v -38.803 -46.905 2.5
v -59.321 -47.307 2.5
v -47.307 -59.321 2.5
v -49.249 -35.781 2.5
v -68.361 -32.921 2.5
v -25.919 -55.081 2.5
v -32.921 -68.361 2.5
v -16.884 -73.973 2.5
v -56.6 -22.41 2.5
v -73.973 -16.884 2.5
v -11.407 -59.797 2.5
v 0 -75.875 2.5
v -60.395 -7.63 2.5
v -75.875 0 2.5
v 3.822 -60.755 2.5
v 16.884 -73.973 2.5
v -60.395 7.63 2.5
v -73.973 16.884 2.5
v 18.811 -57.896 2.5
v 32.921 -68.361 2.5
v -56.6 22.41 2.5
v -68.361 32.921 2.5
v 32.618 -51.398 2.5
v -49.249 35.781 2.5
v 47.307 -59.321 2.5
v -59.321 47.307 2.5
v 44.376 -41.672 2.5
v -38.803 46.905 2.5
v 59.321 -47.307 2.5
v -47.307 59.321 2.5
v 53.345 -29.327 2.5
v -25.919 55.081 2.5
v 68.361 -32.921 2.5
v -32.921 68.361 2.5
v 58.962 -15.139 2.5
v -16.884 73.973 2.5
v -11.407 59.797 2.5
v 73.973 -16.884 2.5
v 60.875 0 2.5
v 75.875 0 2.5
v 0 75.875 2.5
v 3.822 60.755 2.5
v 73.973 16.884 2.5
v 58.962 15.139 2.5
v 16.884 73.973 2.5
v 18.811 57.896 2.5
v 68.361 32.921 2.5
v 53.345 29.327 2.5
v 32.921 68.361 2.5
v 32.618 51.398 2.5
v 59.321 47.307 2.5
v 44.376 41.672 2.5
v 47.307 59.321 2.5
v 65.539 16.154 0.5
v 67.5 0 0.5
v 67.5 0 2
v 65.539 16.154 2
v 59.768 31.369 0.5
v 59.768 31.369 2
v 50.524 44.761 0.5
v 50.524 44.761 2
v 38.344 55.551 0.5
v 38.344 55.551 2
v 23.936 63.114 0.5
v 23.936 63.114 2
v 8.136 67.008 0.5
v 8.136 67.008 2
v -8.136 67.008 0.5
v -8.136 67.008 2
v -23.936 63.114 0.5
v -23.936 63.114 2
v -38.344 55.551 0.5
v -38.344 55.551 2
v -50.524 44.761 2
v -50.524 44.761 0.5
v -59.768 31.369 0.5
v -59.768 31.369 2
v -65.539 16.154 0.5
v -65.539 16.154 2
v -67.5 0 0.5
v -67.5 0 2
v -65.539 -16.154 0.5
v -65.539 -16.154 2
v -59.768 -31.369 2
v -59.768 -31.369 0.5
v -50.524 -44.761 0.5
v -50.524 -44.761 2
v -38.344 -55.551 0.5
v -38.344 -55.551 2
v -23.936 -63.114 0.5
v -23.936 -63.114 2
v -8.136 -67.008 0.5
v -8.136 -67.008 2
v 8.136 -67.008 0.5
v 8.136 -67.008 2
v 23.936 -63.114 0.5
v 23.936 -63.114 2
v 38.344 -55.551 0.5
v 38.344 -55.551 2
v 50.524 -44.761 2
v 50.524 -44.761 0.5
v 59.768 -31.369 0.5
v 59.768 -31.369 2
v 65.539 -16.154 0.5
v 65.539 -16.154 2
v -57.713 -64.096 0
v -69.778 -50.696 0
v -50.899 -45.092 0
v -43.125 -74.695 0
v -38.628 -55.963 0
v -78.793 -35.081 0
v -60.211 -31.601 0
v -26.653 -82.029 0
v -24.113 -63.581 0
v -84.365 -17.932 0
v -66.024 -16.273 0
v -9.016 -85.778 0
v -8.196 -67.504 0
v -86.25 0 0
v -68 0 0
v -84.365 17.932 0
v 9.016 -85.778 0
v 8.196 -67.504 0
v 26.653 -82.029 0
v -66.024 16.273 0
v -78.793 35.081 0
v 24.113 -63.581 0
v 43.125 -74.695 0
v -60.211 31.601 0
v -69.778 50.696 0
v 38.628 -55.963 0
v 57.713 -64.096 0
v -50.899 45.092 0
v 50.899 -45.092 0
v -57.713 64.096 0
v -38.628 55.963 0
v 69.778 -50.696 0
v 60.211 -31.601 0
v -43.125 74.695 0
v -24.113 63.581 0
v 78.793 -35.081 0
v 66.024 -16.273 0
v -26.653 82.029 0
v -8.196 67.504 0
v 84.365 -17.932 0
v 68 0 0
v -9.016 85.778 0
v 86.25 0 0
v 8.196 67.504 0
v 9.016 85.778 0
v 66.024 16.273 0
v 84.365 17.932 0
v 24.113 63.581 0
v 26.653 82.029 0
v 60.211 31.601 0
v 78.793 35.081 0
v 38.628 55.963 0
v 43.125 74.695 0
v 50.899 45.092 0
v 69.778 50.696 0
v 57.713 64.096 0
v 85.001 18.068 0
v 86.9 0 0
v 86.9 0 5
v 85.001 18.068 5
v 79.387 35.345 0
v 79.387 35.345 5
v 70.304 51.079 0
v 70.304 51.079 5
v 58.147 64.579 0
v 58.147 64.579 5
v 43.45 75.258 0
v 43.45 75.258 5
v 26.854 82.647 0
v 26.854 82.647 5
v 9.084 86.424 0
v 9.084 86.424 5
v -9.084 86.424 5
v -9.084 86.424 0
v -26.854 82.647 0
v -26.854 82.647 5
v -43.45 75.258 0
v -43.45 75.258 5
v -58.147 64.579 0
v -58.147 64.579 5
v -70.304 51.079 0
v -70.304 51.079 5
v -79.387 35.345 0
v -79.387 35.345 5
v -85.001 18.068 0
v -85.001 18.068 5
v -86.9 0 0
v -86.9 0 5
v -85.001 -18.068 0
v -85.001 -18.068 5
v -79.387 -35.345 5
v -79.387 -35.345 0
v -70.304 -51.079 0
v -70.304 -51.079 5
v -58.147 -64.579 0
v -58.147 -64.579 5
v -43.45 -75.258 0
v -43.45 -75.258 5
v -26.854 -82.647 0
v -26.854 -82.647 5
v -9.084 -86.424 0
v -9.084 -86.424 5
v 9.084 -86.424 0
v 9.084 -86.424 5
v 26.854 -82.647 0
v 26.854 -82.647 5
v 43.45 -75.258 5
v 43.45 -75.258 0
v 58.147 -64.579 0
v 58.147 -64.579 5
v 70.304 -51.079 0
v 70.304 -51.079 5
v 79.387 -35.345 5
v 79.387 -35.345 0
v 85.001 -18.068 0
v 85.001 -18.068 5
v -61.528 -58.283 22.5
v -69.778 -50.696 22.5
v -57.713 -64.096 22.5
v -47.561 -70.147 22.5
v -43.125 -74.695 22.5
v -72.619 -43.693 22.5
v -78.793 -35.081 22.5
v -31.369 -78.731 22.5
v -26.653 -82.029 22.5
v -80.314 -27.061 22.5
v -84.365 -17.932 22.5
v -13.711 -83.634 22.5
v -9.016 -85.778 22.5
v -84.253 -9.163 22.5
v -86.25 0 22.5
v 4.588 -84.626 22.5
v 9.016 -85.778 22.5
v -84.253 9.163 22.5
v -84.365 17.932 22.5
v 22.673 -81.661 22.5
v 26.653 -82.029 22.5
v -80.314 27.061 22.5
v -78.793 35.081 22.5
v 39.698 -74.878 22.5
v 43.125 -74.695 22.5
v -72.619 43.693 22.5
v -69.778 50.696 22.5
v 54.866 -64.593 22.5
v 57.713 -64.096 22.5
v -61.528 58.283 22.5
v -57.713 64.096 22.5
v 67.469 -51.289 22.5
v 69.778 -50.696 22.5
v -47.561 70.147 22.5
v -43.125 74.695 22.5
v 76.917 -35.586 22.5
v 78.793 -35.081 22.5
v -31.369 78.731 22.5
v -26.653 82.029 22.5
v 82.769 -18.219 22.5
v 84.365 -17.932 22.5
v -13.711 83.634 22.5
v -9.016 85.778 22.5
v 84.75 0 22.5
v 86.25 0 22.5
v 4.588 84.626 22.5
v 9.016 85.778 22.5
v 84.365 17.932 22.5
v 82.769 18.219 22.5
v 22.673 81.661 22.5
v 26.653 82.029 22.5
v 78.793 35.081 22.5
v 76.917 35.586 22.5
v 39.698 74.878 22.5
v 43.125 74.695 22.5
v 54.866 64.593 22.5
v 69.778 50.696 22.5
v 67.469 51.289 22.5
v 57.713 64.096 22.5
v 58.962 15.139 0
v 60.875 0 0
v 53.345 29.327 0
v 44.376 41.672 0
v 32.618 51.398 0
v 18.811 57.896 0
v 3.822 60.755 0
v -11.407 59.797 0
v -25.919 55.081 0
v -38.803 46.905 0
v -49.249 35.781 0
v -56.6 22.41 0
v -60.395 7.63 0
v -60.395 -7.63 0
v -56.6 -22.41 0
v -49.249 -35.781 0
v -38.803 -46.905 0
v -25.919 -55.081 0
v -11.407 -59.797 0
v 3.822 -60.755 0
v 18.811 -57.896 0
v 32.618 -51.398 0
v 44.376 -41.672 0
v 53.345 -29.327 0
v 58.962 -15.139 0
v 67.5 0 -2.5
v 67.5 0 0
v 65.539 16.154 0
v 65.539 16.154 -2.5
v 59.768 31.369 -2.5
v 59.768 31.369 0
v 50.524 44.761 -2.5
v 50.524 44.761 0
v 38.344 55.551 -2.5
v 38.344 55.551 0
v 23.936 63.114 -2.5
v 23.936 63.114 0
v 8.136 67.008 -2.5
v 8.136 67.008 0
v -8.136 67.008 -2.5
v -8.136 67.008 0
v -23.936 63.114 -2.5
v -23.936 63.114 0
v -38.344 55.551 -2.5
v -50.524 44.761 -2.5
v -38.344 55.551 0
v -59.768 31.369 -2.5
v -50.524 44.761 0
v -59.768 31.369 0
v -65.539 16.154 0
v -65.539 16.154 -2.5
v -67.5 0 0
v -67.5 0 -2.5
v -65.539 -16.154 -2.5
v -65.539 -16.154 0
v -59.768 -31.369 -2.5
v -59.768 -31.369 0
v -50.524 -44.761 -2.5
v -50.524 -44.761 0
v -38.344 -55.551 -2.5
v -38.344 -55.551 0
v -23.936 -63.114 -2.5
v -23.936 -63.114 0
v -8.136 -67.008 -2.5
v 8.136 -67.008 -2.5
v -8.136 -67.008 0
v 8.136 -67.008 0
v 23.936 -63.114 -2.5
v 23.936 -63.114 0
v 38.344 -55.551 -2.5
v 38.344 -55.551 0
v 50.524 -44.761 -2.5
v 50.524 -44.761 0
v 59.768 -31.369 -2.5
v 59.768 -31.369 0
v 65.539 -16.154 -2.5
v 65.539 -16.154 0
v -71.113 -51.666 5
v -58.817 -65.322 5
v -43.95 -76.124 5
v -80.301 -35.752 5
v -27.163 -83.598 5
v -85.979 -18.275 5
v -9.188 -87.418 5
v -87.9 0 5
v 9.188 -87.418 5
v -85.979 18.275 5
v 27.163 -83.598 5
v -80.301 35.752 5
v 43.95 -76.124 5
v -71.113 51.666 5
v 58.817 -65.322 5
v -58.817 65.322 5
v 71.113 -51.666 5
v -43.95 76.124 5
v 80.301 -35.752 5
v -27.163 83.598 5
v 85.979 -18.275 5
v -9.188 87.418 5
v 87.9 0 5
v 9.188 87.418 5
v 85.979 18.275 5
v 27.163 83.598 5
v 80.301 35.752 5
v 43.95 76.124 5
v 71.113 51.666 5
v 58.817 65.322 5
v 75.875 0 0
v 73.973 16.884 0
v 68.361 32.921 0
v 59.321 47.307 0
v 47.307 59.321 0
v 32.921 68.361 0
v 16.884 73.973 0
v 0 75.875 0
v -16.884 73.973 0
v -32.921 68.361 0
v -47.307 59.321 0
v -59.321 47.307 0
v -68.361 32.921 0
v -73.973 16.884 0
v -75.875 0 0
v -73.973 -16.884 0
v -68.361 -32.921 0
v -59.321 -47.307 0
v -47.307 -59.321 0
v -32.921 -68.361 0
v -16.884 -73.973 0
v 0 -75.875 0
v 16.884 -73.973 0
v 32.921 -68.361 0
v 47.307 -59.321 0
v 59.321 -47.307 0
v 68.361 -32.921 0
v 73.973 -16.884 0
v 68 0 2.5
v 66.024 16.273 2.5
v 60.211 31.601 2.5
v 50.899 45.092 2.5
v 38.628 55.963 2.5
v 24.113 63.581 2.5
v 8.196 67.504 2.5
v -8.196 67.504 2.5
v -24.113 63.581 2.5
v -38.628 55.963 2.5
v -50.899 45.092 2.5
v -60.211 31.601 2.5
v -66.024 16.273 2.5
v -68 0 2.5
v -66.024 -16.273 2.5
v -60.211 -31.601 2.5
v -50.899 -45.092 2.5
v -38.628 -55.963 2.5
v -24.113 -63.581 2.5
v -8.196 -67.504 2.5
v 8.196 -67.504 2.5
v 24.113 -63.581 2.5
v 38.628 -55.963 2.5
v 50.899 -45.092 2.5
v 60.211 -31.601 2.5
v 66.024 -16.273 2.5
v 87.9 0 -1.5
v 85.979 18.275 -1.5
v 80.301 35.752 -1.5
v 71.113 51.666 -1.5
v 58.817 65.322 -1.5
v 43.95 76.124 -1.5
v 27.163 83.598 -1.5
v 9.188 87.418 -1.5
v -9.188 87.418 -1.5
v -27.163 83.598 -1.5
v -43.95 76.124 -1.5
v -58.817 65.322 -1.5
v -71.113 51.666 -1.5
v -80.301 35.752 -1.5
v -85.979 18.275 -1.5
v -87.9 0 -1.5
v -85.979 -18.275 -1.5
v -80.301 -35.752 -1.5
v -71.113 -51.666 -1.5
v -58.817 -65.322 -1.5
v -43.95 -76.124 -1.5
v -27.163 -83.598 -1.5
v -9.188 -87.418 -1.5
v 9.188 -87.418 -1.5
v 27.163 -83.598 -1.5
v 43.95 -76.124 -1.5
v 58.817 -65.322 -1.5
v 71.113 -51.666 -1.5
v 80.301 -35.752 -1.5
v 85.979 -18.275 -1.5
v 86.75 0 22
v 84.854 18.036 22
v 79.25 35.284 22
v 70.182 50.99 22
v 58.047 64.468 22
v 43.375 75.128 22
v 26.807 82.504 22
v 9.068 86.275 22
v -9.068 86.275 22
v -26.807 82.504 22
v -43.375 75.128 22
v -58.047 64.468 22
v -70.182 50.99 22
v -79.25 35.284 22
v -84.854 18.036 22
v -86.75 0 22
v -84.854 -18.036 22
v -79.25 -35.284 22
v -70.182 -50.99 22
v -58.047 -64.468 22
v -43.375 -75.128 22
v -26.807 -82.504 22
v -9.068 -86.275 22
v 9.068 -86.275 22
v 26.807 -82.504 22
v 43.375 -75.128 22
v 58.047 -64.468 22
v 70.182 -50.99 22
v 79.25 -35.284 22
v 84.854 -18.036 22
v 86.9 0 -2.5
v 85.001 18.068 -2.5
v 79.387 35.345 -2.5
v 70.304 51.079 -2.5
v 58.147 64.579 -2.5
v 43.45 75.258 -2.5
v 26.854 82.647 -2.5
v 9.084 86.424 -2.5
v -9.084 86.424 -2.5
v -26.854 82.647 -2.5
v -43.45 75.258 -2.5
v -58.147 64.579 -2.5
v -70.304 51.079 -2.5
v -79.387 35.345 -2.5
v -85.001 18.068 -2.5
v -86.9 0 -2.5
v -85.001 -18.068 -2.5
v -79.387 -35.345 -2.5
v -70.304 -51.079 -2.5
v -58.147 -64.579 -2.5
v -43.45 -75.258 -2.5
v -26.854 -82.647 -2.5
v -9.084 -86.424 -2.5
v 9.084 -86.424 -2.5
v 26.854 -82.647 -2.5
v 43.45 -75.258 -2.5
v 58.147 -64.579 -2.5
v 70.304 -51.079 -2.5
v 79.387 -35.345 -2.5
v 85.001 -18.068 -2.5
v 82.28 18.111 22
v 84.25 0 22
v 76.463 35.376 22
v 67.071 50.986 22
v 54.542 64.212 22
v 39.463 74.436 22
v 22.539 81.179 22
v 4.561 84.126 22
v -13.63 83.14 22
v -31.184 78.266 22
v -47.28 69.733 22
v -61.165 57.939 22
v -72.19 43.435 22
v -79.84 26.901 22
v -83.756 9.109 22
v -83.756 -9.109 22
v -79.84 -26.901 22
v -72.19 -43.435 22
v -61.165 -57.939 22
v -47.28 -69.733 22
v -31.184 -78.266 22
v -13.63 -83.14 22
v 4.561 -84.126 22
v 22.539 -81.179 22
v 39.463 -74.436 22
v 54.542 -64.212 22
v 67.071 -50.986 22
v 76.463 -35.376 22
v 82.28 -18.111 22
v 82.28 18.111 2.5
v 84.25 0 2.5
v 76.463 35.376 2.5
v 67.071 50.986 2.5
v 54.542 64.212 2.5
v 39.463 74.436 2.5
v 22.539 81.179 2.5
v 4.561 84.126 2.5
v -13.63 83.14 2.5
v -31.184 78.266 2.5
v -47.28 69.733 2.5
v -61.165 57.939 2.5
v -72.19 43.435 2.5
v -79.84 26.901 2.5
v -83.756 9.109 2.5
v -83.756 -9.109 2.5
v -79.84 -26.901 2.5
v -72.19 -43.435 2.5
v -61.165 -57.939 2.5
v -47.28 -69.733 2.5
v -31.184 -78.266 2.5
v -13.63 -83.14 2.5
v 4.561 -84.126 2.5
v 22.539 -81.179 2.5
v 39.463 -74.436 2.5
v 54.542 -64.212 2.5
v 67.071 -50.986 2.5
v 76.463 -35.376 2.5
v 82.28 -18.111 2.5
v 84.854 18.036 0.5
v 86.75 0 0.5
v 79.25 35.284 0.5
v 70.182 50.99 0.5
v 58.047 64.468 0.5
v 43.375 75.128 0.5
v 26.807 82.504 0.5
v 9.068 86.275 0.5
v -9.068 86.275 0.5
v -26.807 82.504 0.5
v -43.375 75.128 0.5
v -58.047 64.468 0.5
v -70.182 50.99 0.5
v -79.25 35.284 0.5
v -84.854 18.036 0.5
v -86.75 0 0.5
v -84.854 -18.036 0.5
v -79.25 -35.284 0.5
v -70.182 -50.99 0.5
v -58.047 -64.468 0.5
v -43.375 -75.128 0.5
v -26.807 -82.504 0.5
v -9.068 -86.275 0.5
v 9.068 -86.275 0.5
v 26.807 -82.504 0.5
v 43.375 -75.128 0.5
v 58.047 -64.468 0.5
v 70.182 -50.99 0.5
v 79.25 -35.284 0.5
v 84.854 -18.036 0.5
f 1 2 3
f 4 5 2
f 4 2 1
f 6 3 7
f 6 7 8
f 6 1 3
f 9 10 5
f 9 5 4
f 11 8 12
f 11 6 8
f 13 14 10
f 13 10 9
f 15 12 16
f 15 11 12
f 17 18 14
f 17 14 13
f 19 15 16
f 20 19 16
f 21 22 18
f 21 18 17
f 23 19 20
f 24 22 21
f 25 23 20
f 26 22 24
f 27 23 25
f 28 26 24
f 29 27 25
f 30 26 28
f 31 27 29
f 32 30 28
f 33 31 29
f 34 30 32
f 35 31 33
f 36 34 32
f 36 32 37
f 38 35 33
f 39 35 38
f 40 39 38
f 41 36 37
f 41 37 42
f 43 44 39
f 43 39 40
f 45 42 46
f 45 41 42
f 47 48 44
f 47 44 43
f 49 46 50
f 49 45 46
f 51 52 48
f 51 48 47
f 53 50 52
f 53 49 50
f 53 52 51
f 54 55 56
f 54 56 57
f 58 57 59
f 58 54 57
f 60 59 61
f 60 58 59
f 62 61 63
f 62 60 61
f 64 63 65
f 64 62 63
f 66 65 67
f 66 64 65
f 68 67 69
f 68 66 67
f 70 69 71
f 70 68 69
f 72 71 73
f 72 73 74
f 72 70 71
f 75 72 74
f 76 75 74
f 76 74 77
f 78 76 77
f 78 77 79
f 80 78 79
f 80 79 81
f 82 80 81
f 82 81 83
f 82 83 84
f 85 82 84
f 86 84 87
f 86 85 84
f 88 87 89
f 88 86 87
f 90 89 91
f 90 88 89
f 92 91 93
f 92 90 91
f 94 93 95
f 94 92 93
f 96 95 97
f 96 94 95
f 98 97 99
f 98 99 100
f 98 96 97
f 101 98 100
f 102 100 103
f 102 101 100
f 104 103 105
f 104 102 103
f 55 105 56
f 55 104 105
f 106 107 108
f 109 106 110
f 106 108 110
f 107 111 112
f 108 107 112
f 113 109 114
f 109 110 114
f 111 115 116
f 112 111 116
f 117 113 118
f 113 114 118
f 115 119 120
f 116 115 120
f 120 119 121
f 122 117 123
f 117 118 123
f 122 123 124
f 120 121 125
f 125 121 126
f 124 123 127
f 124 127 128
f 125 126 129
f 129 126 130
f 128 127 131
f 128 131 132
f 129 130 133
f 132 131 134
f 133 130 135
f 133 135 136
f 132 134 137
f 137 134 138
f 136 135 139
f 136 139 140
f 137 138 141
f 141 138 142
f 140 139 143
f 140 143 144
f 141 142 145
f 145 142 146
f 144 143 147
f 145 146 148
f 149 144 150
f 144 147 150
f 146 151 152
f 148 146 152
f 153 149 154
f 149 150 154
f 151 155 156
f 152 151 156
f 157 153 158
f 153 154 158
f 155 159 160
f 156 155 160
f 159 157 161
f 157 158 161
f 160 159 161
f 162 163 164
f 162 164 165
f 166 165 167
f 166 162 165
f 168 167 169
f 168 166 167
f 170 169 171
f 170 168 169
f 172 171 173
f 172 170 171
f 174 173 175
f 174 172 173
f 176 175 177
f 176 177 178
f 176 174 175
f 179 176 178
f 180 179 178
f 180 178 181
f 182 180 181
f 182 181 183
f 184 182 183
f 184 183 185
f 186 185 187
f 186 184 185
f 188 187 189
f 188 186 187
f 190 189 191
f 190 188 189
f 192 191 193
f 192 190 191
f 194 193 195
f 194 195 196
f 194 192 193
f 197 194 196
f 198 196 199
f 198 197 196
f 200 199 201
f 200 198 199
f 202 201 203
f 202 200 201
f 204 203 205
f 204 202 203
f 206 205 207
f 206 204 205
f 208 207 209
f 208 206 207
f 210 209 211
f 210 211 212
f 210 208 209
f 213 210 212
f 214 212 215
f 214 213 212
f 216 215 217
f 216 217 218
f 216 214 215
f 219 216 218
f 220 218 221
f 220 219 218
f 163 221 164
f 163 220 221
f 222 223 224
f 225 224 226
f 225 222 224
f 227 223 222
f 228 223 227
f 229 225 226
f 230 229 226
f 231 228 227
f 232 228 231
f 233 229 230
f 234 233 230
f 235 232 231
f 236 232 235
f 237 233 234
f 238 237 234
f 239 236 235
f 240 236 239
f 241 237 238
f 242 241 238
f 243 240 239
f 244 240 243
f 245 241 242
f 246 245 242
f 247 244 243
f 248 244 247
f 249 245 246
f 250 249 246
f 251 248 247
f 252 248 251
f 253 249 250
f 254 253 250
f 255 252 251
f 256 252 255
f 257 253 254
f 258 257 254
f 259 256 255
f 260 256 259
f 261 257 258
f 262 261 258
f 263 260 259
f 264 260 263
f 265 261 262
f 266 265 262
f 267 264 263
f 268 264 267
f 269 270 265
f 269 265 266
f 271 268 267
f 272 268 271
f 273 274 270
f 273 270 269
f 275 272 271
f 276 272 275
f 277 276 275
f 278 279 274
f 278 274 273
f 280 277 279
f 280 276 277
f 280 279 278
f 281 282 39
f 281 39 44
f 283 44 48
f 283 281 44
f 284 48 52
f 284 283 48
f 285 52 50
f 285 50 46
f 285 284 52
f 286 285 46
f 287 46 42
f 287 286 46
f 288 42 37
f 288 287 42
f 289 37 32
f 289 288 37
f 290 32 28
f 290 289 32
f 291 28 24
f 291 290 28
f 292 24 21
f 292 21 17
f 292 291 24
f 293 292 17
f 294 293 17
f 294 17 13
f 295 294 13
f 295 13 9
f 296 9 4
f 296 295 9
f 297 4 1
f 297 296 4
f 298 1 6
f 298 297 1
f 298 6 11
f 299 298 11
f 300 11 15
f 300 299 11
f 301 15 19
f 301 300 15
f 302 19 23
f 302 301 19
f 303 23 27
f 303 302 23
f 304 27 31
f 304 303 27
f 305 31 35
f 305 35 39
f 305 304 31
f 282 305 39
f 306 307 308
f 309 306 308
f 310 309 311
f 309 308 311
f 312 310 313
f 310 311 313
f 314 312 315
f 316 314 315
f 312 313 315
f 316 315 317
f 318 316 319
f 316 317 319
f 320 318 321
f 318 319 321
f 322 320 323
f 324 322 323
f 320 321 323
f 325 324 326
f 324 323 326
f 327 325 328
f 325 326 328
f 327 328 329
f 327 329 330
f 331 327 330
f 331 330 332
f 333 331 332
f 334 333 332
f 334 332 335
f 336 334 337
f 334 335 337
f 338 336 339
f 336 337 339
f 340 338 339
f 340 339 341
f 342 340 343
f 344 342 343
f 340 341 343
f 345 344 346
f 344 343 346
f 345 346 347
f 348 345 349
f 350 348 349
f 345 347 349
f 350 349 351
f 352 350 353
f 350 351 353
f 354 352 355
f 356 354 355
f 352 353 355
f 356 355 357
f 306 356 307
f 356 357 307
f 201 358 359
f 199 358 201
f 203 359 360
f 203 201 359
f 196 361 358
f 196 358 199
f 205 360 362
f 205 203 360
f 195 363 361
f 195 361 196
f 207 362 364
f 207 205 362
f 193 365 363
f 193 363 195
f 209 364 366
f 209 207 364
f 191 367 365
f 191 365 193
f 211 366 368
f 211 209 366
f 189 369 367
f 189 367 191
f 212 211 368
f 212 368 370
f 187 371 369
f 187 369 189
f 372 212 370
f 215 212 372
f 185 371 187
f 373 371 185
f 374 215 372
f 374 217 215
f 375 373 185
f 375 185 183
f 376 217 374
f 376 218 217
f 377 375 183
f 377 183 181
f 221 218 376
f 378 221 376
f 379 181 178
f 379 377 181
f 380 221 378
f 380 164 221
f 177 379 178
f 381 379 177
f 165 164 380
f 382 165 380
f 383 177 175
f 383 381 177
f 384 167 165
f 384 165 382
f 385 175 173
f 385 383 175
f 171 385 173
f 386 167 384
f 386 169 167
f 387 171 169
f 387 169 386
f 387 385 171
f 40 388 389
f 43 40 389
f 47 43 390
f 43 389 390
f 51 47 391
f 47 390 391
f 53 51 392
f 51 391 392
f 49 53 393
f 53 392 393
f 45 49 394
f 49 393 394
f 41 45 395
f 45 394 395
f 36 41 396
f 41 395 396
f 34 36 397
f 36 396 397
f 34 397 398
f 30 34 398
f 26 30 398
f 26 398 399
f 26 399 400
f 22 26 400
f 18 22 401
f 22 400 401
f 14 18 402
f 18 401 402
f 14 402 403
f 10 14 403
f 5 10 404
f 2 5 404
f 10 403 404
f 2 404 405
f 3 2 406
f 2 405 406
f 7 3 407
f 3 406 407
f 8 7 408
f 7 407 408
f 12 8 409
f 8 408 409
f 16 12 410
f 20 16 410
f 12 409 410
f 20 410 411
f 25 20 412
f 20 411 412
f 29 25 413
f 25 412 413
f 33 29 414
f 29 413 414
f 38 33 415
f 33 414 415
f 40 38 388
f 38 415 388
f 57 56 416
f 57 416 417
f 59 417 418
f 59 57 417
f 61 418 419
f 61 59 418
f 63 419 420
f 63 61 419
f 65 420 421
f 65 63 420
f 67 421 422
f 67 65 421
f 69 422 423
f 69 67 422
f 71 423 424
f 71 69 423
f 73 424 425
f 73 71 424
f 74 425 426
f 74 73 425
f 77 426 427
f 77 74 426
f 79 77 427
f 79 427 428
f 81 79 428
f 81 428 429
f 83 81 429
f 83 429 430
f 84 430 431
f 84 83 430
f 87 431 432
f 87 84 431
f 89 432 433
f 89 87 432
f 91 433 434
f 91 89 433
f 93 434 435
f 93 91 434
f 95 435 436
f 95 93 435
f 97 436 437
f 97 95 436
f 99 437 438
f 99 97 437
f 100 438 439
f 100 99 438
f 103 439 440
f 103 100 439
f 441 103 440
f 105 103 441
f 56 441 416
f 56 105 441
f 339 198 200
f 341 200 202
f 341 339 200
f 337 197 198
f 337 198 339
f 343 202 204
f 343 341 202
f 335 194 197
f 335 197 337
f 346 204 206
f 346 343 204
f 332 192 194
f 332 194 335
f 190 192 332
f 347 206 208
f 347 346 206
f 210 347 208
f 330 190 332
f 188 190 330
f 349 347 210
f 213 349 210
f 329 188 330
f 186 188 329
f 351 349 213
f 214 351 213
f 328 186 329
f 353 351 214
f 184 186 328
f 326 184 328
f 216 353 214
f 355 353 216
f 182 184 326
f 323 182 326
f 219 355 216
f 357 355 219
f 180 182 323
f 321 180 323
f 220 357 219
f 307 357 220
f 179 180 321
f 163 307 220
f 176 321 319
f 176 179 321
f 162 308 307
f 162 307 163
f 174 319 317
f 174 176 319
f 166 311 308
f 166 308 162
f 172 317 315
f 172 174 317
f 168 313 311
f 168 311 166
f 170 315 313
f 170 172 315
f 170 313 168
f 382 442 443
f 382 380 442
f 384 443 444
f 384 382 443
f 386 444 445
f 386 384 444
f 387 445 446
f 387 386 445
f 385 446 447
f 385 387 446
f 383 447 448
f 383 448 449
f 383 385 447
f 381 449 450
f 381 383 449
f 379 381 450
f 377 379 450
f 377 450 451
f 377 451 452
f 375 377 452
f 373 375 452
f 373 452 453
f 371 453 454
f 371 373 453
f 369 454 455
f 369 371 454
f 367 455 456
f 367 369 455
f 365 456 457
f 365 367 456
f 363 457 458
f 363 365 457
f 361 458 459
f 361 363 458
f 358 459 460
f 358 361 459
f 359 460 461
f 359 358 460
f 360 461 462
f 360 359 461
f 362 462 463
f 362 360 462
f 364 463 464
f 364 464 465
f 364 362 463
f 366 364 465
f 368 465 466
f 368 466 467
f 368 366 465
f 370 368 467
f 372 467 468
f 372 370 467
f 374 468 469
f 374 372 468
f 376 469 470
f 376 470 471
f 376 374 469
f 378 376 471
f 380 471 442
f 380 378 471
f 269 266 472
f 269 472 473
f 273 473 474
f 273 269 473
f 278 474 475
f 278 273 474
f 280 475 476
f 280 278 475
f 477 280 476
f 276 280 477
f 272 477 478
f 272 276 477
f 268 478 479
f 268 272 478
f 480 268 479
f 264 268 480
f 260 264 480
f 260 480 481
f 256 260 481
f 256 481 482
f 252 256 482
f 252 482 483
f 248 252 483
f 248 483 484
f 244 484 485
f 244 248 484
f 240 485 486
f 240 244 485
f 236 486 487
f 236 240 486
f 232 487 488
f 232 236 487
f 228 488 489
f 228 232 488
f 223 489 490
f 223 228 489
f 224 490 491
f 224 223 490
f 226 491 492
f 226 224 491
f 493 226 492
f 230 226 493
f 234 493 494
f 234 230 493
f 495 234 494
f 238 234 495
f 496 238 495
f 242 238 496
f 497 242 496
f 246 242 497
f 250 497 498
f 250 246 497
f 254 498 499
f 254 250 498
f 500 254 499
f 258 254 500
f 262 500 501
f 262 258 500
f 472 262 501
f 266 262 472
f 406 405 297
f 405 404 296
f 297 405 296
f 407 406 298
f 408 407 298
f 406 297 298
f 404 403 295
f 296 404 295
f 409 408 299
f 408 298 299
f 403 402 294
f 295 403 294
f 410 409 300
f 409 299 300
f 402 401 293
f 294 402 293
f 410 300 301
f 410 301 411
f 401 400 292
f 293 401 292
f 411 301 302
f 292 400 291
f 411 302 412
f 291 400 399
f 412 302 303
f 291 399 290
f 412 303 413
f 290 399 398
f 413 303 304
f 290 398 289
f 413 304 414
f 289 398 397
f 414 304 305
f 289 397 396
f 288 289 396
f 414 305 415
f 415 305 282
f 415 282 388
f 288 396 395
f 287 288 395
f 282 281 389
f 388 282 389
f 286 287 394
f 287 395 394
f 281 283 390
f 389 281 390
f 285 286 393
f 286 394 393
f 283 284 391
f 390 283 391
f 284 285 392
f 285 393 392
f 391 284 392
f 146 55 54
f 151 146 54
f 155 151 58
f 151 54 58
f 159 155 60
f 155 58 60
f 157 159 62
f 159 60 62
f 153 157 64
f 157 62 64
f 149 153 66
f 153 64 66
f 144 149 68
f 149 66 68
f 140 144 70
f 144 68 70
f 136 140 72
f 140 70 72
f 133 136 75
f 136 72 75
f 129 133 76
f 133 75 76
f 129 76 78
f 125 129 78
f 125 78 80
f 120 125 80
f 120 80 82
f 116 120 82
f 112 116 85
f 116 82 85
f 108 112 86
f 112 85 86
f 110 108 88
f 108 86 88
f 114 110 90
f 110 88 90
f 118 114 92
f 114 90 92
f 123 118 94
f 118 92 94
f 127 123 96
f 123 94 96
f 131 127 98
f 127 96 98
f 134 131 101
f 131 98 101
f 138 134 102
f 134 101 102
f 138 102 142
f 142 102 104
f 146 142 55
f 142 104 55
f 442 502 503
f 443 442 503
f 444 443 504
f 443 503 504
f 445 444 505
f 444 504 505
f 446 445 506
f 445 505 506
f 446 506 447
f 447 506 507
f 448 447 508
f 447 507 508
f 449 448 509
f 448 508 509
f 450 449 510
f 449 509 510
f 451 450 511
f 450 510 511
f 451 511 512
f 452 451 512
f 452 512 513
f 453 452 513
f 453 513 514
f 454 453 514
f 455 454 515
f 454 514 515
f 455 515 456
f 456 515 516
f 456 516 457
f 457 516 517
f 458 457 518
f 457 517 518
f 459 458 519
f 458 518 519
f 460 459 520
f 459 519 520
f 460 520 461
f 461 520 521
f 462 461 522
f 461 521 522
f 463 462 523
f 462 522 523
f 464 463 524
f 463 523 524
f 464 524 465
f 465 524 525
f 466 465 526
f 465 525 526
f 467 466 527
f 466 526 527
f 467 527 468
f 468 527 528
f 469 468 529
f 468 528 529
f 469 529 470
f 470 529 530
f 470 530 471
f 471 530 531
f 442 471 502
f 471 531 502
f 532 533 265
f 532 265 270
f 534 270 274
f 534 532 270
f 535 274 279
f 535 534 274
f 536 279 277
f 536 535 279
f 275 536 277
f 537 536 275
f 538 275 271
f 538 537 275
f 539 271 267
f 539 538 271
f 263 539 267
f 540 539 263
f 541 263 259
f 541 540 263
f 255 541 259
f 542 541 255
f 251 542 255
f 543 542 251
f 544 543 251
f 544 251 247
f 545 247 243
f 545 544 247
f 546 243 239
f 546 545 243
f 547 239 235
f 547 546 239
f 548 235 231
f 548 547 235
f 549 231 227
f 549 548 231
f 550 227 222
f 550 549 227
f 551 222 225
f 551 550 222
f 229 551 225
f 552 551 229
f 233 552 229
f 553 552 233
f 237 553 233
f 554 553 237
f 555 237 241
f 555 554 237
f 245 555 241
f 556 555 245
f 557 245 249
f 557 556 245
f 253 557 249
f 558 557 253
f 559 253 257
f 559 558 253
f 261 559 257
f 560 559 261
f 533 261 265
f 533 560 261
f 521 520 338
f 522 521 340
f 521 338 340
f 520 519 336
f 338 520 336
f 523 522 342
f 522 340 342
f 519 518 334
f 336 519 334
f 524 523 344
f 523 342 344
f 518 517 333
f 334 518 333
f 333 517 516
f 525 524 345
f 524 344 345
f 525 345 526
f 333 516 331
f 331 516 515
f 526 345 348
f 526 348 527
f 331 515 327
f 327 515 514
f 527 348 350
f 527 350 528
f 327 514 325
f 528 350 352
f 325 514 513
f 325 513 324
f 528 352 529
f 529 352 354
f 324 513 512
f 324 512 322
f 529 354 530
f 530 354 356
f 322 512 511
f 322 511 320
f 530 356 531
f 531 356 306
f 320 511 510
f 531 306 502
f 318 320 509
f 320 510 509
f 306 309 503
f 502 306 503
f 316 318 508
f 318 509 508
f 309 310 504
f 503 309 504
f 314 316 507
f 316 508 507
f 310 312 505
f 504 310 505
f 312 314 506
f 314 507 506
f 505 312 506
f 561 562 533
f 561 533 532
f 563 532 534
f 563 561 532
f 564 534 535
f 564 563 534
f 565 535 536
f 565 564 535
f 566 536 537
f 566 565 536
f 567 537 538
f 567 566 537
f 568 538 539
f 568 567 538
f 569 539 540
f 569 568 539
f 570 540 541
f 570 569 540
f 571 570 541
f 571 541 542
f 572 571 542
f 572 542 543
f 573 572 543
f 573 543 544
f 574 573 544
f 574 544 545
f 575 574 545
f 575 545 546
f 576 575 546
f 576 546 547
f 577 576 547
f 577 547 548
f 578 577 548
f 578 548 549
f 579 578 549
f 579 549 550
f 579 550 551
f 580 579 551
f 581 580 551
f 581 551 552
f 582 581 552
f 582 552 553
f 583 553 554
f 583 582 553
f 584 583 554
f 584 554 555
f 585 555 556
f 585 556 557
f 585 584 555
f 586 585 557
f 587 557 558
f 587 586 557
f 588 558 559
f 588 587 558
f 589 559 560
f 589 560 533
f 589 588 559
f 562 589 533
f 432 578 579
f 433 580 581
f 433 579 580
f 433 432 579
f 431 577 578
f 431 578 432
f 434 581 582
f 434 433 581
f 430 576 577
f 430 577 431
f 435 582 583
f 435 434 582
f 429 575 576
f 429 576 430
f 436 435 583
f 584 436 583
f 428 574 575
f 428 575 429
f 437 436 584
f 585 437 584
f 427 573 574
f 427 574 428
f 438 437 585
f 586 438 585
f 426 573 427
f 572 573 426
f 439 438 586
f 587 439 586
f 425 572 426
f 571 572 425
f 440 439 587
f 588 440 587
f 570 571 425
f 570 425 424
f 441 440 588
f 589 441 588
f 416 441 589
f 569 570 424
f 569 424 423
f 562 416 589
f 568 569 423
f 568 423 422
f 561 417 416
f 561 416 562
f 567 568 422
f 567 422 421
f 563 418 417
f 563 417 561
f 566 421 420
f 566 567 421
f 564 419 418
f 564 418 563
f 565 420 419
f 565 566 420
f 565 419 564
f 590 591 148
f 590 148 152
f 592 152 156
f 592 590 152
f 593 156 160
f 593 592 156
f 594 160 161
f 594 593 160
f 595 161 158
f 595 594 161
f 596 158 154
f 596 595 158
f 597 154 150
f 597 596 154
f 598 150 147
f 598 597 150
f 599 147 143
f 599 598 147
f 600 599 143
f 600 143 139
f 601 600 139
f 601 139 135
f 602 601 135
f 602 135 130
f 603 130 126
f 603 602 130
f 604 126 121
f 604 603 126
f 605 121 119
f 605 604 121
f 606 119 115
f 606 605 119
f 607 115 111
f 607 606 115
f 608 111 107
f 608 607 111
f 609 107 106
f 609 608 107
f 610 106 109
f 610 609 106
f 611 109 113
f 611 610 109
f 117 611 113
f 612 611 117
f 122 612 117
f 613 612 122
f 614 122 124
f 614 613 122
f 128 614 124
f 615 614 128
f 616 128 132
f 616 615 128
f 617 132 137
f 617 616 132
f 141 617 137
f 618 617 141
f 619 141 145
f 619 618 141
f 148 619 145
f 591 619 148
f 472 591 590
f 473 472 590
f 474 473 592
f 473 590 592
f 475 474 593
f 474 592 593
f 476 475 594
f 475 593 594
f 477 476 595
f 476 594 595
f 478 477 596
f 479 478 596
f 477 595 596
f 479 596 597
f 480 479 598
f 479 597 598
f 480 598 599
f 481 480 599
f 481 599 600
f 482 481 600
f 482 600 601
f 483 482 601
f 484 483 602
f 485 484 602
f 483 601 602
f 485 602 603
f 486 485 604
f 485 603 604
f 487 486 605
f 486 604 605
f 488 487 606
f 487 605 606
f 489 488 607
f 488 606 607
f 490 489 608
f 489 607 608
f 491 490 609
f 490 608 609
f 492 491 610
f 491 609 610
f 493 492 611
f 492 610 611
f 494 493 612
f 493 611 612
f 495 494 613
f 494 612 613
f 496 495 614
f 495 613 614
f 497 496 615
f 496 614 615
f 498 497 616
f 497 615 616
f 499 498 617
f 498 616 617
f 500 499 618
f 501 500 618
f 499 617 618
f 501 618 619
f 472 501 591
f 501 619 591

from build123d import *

# Parameters (mm, degrees)
SKETCH_R        = 86.75
SKETCH_R_2      = 67.5
PAD_DEPTH       = 2.5
SKETCH001_R     = 86.75
SKETCH001_R_2   = 84.25
PAD001_DEPTH    = 22.5
CHAMFER_SIZE    = 0.5
CHAMFER001_SIZE = 0.5
CHAMFER002_SIZE = 0.5
CHAMFER003_SIZE = 0.5
CHAMFER004_SIZE = 0.5
SKETCH002_R     = 87.9
SKETCH002_R_2   = 67.5
PAD002_DEPTH    = 2.5
SKETCH003_R     = 87.9
SKETCH003_R_2   = 86.9
PAD003_DEPTH    = 5
CHAMFER005_SIZE = 1
SKETCH004_R     = 75.875
SKETCH004_R_2   = 60.875
PAD004_DEPTH    = 2.5


with BuildPart() as cell:
    # Sketch → Pad (new body)
    with BuildSketch(Plane.XY):
        Circle(SKETCH_R)
        Circle(SKETCH_R_2, mode=Mode.SUBTRACT)
    extrude(amount=PAD_DEPTH)

    # Sketch001 → Pad001 (join)
    with BuildSketch(Plane.XY):
        Circle(SKETCH001_R)
        Circle(SKETCH001_R_2, mode=Mode.SUBTRACT)
    extrude(amount=PAD001_DEPTH)

    # Chamfer
    chamfer_edges = [cell.edges().sort_by_distance(p)[0] for p in [
        (-67.5, 0, 2.5),
    ]]
    chamfer(chamfer_edges, length=CHAMFER_SIZE)

    # Chamfer001
    chamfer001_edges = [cell.edges().sort_by_distance(p)[0] for p in [
        (-86.75, 0, 0),
    ]]
    chamfer(chamfer001_edges, length=CHAMFER001_SIZE)

    # Chamfer002
    chamfer002_edges = [cell.edges().sort_by_distance(p)[0] for p in [
        (-86.75, 0, 22.5),
    ]]
    chamfer(chamfer002_edges, length=CHAMFER002_SIZE)

    # Chamfer003
    chamfer003_edges = [cell.edges().sort_by_distance(p)[0] for p in [
        (-84.25, 0, 22.5),
    ]]
    chamfer(chamfer003_edges, length=CHAMFER003_SIZE)

    # Chamfer004
    chamfer004_edges = [cell.edges().sort_by_distance(p)[0] for p in [
        (-67.5, 0, 0),
    ]]
    chamfer(chamfer004_edges, length=CHAMFER004_SIZE)


with BuildPart() as cell_cover:
    # Sketch002 → Pad002 (new body)
    with BuildSketch(Plane.XY):
        Circle(SKETCH002_R)
        Circle(SKETCH002_R_2, mode=Mode.SUBTRACT)
    extrude(amount=-PAD002_DEPTH)

    # Sketch003 → Pad003 (join)
    with BuildSketch(Plane.XY):
        Circle(SKETCH003_R)
        Circle(SKETCH003_R_2, mode=Mode.SUBTRACT)
    extrude(amount=PAD003_DEPTH)

    # Chamfer005
    chamfer005_edges = [cell_cover.edges().sort_by_distance(p)[0] for p in [
        (-87.9, 0, -2.5),
    ]]
    chamfer(chamfer005_edges, length=CHAMFER005_SIZE)


with BuildPart() as filter_cutting_template:
    # Sketch004 → Pad004 (new body)
    with BuildSketch(Plane.XY):
        Circle(SKETCH004_R)
        Circle(SKETCH004_R_2, mode=Mode.SUBTRACT)
    extrude(amount=PAD004_DEPTH)


solid = Compound([cell.part, cell_cover.part, filter_cutting_template.part])
